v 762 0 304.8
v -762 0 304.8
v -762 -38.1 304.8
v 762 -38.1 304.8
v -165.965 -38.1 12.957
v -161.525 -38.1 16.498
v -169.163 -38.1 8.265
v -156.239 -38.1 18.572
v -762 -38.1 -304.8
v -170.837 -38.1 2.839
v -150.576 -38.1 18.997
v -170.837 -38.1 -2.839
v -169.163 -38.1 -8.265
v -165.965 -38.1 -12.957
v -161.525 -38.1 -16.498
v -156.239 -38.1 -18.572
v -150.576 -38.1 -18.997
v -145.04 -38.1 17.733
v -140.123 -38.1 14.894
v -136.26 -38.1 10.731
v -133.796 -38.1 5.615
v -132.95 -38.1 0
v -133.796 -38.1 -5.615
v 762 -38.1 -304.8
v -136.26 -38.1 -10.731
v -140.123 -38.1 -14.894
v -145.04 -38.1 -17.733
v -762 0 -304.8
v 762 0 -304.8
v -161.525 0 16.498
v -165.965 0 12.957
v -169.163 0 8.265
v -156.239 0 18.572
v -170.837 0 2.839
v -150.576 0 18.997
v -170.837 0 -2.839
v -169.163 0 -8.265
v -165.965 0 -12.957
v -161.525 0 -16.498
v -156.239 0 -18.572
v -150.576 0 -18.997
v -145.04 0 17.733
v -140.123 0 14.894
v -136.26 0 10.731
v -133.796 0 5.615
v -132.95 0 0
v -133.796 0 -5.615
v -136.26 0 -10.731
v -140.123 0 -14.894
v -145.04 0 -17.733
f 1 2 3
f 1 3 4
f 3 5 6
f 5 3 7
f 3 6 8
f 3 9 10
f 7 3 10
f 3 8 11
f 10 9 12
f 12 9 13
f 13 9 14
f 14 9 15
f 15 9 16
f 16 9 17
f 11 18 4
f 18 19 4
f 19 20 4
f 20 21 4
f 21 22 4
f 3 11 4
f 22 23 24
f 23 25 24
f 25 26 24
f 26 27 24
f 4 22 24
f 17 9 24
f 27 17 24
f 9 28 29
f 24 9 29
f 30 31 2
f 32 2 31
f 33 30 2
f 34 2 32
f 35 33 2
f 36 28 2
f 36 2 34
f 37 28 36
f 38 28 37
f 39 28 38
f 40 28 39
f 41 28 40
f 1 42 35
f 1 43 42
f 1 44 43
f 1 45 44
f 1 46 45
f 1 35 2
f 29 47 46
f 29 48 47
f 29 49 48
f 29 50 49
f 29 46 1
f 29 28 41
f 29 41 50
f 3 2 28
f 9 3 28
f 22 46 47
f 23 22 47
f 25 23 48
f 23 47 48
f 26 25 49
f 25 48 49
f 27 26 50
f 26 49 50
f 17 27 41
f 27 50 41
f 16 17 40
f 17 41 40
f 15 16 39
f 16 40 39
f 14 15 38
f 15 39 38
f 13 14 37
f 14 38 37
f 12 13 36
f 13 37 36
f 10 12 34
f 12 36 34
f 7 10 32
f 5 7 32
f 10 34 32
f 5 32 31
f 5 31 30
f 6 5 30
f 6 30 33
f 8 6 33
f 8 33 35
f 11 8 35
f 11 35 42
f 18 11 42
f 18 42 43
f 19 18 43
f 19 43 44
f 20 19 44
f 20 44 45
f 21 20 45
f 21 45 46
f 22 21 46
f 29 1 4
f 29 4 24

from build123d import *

# Parameters (mm, degrees)
SKETCH1_W           = 1524
SKETCH1_H           = 609.6
BOSS_EXTRUDE1_DEPTH = 38.1
SKETCH2_R           = 19.05
CUT_EXTRUDE1_DEPTH  = 39.1


with BuildPart() as part:
    # Sketch1 → Boss-Extrude1 (new body)
    with BuildSketch(Plane(origin=(0, 0, 0), x_dir=(1, 0, 0), z_dir=(0, 1, 0))):
        Rectangle(SKETCH1_W, SKETCH1_H)
    extrude(amount=-BOSS_EXTRUDE1_DEPTH)

    # Sketch2 → Cut-Extrude1 (cut, through all)
    with BuildSketch(Plane(origin=(0, 0, 0), x_dir=(1, 0, 0), z_dir=(0, 1, 0))):
        with Locations((-152, 0)):
            Circle(SKETCH2_R)
    extrude(amount=-CUT_EXTRUDE1_DEPTH, mode=Mode.SUBTRACT)


solid = part.part
